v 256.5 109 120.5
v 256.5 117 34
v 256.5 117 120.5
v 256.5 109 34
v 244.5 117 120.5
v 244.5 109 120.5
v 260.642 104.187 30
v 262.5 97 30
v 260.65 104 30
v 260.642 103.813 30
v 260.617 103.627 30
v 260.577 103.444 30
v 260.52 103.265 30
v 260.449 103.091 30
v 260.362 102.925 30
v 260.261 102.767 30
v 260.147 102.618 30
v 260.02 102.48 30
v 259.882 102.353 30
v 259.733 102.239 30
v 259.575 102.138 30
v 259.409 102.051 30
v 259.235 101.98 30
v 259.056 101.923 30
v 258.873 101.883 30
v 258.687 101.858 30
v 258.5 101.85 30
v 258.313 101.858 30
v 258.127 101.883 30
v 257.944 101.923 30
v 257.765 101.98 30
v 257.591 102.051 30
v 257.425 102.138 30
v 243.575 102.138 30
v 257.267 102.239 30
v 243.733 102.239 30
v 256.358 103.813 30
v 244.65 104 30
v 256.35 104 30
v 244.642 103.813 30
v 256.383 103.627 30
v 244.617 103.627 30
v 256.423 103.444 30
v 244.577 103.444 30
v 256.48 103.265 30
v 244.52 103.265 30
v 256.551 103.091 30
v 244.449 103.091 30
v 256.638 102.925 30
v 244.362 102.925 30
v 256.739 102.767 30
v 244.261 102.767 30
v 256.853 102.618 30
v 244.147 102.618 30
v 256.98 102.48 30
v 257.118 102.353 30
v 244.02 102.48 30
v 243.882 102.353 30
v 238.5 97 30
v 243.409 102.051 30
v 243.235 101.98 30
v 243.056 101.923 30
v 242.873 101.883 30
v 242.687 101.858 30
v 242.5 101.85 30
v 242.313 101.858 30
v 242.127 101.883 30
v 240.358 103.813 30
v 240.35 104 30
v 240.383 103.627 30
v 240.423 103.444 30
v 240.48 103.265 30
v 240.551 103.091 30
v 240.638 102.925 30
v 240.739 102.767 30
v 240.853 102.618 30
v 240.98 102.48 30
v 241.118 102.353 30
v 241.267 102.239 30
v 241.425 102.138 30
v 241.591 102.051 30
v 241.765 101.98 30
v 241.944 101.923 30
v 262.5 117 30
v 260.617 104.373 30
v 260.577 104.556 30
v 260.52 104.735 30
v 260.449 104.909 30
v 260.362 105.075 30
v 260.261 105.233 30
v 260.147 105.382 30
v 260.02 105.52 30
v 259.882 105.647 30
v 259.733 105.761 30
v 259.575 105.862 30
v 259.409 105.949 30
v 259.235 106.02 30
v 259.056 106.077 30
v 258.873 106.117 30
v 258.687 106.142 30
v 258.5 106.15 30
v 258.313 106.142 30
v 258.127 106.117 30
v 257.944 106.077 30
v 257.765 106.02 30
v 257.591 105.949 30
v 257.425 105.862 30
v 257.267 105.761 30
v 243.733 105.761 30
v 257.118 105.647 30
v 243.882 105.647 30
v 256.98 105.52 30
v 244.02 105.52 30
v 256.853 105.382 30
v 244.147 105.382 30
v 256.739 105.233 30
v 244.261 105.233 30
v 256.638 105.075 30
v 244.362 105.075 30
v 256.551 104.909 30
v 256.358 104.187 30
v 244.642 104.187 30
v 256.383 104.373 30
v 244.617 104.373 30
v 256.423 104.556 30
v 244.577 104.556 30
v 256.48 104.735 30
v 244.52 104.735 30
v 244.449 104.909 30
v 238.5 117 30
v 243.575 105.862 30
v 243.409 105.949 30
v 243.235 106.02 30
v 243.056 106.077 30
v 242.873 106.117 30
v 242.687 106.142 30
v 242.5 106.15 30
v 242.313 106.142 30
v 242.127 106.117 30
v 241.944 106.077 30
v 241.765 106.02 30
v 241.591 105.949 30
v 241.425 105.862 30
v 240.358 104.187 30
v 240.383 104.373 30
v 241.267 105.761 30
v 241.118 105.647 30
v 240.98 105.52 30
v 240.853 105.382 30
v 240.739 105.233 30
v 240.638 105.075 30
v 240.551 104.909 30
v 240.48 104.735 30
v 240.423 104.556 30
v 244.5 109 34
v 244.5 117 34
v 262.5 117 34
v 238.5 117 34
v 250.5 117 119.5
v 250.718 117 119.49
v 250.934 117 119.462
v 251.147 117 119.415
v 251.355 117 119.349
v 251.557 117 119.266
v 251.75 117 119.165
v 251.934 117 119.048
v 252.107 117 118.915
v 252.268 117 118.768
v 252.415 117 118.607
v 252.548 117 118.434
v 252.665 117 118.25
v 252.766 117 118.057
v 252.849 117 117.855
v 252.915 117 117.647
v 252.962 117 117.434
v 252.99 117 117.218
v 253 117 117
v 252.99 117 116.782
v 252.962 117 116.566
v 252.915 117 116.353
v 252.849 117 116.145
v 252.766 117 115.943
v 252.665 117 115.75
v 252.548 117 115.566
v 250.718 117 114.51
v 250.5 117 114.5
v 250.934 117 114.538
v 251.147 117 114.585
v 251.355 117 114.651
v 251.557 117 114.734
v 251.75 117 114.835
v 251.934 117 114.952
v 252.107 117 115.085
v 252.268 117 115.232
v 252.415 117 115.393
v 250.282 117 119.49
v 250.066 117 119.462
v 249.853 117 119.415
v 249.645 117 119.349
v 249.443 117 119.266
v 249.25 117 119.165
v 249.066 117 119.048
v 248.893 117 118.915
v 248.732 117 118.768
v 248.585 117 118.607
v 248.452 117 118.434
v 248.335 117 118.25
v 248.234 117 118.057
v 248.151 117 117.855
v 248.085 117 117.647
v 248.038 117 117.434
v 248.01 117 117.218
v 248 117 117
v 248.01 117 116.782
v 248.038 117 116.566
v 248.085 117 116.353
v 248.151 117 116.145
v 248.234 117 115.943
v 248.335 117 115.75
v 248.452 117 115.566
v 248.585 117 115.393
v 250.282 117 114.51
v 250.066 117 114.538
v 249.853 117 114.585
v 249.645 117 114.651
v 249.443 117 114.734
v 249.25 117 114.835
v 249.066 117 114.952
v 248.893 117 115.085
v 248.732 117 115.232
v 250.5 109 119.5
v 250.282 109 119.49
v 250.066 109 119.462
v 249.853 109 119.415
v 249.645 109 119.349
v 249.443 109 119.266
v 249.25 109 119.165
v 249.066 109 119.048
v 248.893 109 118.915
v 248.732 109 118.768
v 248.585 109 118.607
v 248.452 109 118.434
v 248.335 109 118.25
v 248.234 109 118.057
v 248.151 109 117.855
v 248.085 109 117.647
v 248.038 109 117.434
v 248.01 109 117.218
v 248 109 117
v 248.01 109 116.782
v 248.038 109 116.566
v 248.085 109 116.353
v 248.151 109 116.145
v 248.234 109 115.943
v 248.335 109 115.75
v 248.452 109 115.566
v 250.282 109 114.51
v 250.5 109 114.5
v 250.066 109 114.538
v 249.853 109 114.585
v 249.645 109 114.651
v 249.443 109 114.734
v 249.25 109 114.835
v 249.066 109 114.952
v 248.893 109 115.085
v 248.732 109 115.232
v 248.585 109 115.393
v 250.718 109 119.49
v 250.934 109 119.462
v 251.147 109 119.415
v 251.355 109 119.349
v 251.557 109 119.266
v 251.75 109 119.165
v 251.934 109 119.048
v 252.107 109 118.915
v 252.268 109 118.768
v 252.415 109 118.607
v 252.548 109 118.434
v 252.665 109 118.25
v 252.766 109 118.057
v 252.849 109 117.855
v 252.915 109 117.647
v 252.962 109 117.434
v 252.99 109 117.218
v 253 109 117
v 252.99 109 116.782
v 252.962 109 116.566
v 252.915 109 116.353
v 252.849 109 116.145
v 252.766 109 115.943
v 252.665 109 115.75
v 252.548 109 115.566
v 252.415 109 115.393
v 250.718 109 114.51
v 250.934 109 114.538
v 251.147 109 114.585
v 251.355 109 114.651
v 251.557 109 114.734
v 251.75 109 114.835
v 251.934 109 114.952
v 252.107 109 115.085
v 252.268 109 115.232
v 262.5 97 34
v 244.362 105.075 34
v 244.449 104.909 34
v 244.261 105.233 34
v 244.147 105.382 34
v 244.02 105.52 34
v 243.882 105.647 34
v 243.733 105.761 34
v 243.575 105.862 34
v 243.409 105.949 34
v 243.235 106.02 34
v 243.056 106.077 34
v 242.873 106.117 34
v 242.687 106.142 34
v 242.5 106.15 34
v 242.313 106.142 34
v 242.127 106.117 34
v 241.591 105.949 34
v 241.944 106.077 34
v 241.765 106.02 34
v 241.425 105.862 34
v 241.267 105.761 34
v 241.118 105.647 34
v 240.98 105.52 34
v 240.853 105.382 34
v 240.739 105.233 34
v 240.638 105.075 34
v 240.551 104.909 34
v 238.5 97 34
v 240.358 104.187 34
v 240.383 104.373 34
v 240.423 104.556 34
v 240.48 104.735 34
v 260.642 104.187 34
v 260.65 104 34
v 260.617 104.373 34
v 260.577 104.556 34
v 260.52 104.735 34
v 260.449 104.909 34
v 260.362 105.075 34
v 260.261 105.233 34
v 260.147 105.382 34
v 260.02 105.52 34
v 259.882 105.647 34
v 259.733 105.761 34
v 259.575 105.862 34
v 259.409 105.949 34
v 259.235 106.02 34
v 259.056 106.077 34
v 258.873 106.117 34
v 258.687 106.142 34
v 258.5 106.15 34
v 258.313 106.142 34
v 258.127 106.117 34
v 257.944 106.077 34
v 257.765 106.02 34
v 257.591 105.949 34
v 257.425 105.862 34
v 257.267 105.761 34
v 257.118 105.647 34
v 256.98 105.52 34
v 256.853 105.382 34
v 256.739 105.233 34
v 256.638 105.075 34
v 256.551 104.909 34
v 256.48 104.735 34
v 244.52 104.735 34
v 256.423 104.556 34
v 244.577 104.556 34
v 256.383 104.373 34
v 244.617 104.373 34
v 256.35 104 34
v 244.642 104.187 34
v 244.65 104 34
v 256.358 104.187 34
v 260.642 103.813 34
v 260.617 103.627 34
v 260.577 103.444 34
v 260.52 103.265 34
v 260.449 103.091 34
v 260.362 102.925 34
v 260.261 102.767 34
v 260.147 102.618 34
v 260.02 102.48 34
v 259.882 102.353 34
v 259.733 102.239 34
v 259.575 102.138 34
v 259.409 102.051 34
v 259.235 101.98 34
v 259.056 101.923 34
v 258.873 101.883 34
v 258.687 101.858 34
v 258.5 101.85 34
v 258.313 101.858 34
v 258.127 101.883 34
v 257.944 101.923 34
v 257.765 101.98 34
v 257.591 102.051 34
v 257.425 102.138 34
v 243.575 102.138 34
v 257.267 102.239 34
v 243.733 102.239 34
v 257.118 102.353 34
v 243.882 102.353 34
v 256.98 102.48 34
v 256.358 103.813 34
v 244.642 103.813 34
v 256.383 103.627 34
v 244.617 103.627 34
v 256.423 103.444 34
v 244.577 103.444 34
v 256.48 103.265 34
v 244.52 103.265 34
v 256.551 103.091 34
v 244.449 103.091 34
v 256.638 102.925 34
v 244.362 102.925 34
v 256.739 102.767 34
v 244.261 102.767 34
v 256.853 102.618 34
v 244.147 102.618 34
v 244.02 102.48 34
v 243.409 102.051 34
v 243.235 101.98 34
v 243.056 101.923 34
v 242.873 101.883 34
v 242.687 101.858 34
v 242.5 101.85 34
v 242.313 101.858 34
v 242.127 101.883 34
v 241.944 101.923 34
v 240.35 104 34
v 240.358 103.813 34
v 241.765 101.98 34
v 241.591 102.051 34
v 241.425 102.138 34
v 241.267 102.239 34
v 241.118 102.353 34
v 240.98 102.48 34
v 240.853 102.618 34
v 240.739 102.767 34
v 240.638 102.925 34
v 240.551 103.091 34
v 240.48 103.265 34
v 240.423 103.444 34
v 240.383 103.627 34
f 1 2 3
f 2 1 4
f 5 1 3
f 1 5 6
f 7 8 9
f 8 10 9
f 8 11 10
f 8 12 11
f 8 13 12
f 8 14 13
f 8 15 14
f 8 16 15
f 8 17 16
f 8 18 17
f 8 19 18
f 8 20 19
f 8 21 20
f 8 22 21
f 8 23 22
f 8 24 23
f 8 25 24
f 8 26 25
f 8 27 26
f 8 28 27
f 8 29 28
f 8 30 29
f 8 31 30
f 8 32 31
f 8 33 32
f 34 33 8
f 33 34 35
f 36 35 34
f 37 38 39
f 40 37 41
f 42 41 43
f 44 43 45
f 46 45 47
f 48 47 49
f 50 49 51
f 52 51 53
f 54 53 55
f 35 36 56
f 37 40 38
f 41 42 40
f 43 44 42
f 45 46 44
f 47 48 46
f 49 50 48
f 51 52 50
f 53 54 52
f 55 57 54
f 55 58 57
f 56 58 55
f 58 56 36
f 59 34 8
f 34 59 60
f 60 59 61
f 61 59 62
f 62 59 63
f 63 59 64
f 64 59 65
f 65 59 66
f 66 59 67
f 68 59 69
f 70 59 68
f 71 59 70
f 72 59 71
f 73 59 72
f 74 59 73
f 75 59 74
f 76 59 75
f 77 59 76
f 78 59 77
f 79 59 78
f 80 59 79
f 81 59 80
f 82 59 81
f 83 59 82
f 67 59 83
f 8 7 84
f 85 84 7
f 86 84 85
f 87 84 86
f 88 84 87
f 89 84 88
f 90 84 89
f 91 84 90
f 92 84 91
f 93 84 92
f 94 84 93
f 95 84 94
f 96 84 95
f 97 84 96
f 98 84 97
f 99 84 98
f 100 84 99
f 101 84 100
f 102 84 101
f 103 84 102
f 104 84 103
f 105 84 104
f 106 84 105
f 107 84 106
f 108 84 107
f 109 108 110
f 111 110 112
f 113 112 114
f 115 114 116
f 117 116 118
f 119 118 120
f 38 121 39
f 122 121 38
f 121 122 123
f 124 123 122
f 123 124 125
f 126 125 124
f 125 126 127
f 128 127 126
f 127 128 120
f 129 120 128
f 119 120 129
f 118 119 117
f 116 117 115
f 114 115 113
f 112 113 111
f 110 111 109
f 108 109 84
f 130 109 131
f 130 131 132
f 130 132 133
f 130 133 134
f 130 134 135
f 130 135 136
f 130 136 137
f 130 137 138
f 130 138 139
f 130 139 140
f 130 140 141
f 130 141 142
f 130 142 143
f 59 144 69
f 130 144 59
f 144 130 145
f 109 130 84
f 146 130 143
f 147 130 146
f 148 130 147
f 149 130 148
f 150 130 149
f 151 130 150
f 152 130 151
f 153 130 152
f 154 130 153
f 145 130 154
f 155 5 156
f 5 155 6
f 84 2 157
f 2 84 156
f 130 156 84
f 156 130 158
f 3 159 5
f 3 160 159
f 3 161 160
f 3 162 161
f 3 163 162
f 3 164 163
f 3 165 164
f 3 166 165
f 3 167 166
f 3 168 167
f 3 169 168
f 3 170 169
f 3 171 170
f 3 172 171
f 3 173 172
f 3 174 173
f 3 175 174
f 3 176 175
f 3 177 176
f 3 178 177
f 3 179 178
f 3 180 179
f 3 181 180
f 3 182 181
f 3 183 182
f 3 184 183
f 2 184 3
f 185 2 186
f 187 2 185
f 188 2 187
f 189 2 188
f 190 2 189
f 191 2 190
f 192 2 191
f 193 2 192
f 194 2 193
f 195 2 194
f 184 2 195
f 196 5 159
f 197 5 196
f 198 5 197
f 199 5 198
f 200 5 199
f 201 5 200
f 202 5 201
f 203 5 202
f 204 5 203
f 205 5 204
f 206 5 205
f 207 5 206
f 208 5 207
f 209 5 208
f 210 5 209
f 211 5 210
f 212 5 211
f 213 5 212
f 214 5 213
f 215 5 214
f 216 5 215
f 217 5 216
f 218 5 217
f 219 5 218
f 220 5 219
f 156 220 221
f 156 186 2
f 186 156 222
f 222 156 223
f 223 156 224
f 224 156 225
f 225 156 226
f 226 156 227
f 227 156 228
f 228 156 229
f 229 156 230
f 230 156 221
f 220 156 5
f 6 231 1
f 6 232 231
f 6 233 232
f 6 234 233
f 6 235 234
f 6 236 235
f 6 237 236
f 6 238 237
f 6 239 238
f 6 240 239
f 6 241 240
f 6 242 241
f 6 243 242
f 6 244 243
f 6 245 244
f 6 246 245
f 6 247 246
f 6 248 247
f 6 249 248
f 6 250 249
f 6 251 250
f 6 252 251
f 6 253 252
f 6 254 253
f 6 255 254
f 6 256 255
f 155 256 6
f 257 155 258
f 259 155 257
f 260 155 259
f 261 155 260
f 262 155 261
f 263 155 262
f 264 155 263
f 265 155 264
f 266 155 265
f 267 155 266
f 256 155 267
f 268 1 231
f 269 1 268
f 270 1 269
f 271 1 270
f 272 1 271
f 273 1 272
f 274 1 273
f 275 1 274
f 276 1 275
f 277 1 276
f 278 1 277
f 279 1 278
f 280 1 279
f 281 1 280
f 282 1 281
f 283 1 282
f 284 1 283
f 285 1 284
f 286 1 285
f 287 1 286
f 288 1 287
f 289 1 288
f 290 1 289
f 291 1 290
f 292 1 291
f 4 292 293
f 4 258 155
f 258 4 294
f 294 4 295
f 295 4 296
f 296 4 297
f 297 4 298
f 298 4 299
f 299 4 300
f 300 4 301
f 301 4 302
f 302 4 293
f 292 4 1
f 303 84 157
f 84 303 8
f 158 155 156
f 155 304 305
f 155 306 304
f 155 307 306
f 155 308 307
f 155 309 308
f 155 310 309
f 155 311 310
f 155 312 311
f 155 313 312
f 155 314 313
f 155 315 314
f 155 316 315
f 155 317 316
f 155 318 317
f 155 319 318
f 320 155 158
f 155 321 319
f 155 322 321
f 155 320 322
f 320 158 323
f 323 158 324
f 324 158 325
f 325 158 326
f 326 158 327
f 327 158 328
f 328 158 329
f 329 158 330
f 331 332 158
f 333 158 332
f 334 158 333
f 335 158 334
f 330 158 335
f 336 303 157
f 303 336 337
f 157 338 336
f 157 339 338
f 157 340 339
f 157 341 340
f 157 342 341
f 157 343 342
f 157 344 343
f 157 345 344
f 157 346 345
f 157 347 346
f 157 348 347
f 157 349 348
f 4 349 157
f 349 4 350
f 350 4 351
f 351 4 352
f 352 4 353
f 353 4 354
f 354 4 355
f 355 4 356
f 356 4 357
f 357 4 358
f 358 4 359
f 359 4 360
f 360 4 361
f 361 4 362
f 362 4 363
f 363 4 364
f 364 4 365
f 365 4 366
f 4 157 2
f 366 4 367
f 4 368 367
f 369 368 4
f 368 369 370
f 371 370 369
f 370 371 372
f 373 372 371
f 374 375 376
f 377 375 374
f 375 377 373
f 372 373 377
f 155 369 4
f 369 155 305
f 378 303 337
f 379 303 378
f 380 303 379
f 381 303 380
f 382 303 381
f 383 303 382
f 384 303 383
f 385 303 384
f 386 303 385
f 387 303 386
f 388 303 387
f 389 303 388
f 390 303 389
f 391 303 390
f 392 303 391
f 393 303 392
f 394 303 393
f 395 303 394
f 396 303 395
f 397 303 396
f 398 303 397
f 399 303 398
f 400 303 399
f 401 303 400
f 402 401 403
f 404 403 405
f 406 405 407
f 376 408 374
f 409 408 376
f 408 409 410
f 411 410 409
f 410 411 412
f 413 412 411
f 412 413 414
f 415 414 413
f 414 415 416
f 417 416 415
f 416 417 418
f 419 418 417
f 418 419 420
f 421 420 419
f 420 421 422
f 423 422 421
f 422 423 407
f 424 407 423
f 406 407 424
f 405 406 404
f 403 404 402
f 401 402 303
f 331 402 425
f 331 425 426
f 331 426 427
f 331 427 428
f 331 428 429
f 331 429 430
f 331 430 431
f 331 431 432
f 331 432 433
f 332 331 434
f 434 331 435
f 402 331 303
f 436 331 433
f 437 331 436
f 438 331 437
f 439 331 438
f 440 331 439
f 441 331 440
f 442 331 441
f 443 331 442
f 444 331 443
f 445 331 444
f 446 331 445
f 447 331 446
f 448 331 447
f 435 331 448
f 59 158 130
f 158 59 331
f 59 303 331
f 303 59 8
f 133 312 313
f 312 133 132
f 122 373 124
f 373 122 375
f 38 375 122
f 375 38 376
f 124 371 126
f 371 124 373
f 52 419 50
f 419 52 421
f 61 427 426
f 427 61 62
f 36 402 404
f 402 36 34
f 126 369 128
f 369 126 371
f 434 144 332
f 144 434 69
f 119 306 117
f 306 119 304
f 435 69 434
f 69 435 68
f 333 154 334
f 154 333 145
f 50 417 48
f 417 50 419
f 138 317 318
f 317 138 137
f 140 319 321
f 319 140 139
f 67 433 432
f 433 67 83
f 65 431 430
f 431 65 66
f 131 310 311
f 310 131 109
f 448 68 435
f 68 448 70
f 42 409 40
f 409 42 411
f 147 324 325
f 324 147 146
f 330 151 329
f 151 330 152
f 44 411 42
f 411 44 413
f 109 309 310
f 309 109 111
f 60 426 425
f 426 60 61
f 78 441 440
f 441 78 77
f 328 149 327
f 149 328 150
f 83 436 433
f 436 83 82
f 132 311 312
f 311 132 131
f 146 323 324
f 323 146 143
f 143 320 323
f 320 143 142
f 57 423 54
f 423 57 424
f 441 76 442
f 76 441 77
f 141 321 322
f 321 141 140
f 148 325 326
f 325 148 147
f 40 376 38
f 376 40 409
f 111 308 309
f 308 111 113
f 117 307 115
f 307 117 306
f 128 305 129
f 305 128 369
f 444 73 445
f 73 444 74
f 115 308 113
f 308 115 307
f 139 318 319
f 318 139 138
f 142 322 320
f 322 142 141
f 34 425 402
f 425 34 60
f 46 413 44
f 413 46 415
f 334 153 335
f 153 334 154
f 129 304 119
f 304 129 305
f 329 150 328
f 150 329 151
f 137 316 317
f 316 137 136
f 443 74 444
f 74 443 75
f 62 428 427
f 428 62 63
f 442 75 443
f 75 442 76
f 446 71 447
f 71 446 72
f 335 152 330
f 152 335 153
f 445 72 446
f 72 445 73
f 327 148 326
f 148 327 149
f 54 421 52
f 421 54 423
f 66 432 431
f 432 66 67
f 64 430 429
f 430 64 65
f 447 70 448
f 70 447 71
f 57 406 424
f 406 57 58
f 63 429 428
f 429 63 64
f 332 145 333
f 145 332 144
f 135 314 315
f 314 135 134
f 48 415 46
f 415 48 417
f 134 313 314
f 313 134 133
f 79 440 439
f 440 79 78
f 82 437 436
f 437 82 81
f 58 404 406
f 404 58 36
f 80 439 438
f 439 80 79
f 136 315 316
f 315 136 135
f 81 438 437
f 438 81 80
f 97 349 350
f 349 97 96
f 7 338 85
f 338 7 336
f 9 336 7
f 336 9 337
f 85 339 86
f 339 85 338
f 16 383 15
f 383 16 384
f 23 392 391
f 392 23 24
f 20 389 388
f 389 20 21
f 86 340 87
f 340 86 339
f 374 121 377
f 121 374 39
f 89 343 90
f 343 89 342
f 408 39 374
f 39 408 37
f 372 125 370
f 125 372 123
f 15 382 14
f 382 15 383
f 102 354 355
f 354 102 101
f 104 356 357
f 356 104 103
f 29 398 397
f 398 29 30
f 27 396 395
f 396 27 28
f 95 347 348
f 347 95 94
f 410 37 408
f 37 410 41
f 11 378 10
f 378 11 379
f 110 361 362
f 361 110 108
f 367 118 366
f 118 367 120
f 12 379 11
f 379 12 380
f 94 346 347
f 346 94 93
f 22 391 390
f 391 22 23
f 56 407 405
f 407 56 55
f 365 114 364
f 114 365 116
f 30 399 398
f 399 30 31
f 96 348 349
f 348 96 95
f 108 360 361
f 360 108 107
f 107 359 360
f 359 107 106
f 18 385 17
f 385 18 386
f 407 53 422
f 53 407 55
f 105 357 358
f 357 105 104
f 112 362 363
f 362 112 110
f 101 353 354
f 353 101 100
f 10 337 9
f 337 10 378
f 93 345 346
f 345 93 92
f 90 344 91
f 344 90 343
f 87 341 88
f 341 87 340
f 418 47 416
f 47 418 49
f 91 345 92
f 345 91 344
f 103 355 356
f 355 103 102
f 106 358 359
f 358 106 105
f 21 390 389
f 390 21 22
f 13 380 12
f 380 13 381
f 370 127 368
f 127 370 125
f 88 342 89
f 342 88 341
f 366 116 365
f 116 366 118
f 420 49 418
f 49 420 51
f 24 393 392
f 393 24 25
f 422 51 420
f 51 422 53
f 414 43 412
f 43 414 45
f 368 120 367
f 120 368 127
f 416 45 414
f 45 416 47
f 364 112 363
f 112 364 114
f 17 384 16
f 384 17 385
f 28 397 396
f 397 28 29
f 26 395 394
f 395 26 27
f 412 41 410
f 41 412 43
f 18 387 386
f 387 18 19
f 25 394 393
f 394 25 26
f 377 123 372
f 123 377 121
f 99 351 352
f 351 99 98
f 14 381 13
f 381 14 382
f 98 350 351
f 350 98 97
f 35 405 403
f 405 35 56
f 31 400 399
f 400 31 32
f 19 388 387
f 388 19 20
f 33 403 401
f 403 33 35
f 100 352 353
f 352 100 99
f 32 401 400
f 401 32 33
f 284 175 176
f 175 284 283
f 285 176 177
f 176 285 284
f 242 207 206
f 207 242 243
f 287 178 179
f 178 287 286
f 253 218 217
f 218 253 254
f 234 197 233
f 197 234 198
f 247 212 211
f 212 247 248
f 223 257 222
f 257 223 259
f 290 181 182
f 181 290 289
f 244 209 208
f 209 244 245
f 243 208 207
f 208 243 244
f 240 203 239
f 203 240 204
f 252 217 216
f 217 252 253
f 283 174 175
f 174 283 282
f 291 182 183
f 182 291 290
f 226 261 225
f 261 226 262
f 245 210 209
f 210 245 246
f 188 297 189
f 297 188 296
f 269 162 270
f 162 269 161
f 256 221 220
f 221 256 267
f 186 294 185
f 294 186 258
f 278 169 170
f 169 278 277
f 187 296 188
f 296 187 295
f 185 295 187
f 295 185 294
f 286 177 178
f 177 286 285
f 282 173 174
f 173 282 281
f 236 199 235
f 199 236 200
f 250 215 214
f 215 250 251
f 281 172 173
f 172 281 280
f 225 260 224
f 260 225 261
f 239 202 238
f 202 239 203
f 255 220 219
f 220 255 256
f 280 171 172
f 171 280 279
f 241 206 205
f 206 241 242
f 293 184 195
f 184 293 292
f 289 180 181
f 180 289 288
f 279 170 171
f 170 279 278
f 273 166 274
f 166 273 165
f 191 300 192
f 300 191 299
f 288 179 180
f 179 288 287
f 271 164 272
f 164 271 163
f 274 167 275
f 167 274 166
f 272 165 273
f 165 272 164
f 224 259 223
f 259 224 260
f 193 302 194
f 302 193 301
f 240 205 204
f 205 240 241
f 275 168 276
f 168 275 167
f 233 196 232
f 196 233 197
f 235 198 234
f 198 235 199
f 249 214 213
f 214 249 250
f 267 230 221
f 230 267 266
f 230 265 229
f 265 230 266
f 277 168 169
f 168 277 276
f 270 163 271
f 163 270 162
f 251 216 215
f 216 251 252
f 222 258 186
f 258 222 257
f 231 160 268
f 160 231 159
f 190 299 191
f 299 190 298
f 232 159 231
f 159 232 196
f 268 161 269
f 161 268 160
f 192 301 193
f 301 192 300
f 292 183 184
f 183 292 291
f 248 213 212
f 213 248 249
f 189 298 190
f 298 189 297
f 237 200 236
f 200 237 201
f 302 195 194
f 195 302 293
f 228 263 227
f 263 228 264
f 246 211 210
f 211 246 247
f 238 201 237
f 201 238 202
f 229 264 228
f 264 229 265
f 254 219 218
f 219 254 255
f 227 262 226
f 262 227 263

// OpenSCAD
// Fabrication-only fixed mounts, mm above bench; no runtime edits.
$fn=72;
PART="guard_pedestal";
SIDE=1; // +1 at y113, -1 at y-3
module guard_pedestal(side=1){
 y=side==1?113:-3; fy=side==1?107:3; by=side==1?104:6;
 difference(){union(){
 translate([250.5,y,75.25])cube([12,8,90.5],center=true);
 translate([250.5,fy,32])cube([24,20,4],center=true);
 }
 translate([250.5,y,117])rotate([90,0,0])cylinder(d=5,h=12,center=true);
 for(x=[242.5,258.5])translate([x,by,32])cylinder(d=4.3,h=8,center=true);
 }
}
module guide_base(){difference(){
 translate([371.5,55,41.5])cube([57,146,8],center=true);
 for(y=[-5,115]){
 translate([390,y,41.5])cylinder(d=4.3,h=12,center=true);
 translate([390,y,43.4])cylinder(d1=4.3,d2=8.4,h=2.1);
 translate([351,y,41.5])cylinder(d=8.3,h=12,center=true);
 for(dy=[-8.5,8.5])translate([356,y+dy,41.5])cylinder(d=3.3,h=12,center=true);
 }
}}
module guide_floor_foot(y=115){difference(){
 translate([390,y,27.75])cube([20,24,19.5],center=true);
 translate([390,y,27.75])cylinder(d=4.3,h=24,center=true);
 for(z=[21,34.5])translate([390,y,z])cylinder(d=5.5,h=6,center=true);
}}
module rod_retainer(y=115){difference(){
 translate([351,y,55.5])cube([16,24,20],center=true);
 translate([351,y,55.5])cylinder(d=8.1,h=24,center=true);
 for(dy=[-8.5,8.5]){
 translate([356,y+dy,55.5])cylinder(d=3.3,h=24,center=true);
 translate([356,y+dy,63.85])cylinder(d1=3.3,d2=6.6,h=1.65);
 }
 for(z=[51,60]){
 translate([345,y,z])rotate([0,90,0])cylinder(d=2.5,h=8,center=true);
 translate([344.5,y,z])rotate([0,90,0])cylinder(d=4,h=3,center=true);
 }
}}
if(PART=="guard_pedestal")guard_pedestal(SIDE);
if(PART=="guide_base")guide_base();
if(PART=="guide_floor_foot")guide_floor_foot(115);
if(PART=="rod_retainer")rod_retainer(115);
if(PART=="assembly"){
 for(side=[-1,1])guard_pedestal(side);
 guide_base();for(y=[-5,115]){rod_retainer(y);guide_floor_foot(y);}
}
